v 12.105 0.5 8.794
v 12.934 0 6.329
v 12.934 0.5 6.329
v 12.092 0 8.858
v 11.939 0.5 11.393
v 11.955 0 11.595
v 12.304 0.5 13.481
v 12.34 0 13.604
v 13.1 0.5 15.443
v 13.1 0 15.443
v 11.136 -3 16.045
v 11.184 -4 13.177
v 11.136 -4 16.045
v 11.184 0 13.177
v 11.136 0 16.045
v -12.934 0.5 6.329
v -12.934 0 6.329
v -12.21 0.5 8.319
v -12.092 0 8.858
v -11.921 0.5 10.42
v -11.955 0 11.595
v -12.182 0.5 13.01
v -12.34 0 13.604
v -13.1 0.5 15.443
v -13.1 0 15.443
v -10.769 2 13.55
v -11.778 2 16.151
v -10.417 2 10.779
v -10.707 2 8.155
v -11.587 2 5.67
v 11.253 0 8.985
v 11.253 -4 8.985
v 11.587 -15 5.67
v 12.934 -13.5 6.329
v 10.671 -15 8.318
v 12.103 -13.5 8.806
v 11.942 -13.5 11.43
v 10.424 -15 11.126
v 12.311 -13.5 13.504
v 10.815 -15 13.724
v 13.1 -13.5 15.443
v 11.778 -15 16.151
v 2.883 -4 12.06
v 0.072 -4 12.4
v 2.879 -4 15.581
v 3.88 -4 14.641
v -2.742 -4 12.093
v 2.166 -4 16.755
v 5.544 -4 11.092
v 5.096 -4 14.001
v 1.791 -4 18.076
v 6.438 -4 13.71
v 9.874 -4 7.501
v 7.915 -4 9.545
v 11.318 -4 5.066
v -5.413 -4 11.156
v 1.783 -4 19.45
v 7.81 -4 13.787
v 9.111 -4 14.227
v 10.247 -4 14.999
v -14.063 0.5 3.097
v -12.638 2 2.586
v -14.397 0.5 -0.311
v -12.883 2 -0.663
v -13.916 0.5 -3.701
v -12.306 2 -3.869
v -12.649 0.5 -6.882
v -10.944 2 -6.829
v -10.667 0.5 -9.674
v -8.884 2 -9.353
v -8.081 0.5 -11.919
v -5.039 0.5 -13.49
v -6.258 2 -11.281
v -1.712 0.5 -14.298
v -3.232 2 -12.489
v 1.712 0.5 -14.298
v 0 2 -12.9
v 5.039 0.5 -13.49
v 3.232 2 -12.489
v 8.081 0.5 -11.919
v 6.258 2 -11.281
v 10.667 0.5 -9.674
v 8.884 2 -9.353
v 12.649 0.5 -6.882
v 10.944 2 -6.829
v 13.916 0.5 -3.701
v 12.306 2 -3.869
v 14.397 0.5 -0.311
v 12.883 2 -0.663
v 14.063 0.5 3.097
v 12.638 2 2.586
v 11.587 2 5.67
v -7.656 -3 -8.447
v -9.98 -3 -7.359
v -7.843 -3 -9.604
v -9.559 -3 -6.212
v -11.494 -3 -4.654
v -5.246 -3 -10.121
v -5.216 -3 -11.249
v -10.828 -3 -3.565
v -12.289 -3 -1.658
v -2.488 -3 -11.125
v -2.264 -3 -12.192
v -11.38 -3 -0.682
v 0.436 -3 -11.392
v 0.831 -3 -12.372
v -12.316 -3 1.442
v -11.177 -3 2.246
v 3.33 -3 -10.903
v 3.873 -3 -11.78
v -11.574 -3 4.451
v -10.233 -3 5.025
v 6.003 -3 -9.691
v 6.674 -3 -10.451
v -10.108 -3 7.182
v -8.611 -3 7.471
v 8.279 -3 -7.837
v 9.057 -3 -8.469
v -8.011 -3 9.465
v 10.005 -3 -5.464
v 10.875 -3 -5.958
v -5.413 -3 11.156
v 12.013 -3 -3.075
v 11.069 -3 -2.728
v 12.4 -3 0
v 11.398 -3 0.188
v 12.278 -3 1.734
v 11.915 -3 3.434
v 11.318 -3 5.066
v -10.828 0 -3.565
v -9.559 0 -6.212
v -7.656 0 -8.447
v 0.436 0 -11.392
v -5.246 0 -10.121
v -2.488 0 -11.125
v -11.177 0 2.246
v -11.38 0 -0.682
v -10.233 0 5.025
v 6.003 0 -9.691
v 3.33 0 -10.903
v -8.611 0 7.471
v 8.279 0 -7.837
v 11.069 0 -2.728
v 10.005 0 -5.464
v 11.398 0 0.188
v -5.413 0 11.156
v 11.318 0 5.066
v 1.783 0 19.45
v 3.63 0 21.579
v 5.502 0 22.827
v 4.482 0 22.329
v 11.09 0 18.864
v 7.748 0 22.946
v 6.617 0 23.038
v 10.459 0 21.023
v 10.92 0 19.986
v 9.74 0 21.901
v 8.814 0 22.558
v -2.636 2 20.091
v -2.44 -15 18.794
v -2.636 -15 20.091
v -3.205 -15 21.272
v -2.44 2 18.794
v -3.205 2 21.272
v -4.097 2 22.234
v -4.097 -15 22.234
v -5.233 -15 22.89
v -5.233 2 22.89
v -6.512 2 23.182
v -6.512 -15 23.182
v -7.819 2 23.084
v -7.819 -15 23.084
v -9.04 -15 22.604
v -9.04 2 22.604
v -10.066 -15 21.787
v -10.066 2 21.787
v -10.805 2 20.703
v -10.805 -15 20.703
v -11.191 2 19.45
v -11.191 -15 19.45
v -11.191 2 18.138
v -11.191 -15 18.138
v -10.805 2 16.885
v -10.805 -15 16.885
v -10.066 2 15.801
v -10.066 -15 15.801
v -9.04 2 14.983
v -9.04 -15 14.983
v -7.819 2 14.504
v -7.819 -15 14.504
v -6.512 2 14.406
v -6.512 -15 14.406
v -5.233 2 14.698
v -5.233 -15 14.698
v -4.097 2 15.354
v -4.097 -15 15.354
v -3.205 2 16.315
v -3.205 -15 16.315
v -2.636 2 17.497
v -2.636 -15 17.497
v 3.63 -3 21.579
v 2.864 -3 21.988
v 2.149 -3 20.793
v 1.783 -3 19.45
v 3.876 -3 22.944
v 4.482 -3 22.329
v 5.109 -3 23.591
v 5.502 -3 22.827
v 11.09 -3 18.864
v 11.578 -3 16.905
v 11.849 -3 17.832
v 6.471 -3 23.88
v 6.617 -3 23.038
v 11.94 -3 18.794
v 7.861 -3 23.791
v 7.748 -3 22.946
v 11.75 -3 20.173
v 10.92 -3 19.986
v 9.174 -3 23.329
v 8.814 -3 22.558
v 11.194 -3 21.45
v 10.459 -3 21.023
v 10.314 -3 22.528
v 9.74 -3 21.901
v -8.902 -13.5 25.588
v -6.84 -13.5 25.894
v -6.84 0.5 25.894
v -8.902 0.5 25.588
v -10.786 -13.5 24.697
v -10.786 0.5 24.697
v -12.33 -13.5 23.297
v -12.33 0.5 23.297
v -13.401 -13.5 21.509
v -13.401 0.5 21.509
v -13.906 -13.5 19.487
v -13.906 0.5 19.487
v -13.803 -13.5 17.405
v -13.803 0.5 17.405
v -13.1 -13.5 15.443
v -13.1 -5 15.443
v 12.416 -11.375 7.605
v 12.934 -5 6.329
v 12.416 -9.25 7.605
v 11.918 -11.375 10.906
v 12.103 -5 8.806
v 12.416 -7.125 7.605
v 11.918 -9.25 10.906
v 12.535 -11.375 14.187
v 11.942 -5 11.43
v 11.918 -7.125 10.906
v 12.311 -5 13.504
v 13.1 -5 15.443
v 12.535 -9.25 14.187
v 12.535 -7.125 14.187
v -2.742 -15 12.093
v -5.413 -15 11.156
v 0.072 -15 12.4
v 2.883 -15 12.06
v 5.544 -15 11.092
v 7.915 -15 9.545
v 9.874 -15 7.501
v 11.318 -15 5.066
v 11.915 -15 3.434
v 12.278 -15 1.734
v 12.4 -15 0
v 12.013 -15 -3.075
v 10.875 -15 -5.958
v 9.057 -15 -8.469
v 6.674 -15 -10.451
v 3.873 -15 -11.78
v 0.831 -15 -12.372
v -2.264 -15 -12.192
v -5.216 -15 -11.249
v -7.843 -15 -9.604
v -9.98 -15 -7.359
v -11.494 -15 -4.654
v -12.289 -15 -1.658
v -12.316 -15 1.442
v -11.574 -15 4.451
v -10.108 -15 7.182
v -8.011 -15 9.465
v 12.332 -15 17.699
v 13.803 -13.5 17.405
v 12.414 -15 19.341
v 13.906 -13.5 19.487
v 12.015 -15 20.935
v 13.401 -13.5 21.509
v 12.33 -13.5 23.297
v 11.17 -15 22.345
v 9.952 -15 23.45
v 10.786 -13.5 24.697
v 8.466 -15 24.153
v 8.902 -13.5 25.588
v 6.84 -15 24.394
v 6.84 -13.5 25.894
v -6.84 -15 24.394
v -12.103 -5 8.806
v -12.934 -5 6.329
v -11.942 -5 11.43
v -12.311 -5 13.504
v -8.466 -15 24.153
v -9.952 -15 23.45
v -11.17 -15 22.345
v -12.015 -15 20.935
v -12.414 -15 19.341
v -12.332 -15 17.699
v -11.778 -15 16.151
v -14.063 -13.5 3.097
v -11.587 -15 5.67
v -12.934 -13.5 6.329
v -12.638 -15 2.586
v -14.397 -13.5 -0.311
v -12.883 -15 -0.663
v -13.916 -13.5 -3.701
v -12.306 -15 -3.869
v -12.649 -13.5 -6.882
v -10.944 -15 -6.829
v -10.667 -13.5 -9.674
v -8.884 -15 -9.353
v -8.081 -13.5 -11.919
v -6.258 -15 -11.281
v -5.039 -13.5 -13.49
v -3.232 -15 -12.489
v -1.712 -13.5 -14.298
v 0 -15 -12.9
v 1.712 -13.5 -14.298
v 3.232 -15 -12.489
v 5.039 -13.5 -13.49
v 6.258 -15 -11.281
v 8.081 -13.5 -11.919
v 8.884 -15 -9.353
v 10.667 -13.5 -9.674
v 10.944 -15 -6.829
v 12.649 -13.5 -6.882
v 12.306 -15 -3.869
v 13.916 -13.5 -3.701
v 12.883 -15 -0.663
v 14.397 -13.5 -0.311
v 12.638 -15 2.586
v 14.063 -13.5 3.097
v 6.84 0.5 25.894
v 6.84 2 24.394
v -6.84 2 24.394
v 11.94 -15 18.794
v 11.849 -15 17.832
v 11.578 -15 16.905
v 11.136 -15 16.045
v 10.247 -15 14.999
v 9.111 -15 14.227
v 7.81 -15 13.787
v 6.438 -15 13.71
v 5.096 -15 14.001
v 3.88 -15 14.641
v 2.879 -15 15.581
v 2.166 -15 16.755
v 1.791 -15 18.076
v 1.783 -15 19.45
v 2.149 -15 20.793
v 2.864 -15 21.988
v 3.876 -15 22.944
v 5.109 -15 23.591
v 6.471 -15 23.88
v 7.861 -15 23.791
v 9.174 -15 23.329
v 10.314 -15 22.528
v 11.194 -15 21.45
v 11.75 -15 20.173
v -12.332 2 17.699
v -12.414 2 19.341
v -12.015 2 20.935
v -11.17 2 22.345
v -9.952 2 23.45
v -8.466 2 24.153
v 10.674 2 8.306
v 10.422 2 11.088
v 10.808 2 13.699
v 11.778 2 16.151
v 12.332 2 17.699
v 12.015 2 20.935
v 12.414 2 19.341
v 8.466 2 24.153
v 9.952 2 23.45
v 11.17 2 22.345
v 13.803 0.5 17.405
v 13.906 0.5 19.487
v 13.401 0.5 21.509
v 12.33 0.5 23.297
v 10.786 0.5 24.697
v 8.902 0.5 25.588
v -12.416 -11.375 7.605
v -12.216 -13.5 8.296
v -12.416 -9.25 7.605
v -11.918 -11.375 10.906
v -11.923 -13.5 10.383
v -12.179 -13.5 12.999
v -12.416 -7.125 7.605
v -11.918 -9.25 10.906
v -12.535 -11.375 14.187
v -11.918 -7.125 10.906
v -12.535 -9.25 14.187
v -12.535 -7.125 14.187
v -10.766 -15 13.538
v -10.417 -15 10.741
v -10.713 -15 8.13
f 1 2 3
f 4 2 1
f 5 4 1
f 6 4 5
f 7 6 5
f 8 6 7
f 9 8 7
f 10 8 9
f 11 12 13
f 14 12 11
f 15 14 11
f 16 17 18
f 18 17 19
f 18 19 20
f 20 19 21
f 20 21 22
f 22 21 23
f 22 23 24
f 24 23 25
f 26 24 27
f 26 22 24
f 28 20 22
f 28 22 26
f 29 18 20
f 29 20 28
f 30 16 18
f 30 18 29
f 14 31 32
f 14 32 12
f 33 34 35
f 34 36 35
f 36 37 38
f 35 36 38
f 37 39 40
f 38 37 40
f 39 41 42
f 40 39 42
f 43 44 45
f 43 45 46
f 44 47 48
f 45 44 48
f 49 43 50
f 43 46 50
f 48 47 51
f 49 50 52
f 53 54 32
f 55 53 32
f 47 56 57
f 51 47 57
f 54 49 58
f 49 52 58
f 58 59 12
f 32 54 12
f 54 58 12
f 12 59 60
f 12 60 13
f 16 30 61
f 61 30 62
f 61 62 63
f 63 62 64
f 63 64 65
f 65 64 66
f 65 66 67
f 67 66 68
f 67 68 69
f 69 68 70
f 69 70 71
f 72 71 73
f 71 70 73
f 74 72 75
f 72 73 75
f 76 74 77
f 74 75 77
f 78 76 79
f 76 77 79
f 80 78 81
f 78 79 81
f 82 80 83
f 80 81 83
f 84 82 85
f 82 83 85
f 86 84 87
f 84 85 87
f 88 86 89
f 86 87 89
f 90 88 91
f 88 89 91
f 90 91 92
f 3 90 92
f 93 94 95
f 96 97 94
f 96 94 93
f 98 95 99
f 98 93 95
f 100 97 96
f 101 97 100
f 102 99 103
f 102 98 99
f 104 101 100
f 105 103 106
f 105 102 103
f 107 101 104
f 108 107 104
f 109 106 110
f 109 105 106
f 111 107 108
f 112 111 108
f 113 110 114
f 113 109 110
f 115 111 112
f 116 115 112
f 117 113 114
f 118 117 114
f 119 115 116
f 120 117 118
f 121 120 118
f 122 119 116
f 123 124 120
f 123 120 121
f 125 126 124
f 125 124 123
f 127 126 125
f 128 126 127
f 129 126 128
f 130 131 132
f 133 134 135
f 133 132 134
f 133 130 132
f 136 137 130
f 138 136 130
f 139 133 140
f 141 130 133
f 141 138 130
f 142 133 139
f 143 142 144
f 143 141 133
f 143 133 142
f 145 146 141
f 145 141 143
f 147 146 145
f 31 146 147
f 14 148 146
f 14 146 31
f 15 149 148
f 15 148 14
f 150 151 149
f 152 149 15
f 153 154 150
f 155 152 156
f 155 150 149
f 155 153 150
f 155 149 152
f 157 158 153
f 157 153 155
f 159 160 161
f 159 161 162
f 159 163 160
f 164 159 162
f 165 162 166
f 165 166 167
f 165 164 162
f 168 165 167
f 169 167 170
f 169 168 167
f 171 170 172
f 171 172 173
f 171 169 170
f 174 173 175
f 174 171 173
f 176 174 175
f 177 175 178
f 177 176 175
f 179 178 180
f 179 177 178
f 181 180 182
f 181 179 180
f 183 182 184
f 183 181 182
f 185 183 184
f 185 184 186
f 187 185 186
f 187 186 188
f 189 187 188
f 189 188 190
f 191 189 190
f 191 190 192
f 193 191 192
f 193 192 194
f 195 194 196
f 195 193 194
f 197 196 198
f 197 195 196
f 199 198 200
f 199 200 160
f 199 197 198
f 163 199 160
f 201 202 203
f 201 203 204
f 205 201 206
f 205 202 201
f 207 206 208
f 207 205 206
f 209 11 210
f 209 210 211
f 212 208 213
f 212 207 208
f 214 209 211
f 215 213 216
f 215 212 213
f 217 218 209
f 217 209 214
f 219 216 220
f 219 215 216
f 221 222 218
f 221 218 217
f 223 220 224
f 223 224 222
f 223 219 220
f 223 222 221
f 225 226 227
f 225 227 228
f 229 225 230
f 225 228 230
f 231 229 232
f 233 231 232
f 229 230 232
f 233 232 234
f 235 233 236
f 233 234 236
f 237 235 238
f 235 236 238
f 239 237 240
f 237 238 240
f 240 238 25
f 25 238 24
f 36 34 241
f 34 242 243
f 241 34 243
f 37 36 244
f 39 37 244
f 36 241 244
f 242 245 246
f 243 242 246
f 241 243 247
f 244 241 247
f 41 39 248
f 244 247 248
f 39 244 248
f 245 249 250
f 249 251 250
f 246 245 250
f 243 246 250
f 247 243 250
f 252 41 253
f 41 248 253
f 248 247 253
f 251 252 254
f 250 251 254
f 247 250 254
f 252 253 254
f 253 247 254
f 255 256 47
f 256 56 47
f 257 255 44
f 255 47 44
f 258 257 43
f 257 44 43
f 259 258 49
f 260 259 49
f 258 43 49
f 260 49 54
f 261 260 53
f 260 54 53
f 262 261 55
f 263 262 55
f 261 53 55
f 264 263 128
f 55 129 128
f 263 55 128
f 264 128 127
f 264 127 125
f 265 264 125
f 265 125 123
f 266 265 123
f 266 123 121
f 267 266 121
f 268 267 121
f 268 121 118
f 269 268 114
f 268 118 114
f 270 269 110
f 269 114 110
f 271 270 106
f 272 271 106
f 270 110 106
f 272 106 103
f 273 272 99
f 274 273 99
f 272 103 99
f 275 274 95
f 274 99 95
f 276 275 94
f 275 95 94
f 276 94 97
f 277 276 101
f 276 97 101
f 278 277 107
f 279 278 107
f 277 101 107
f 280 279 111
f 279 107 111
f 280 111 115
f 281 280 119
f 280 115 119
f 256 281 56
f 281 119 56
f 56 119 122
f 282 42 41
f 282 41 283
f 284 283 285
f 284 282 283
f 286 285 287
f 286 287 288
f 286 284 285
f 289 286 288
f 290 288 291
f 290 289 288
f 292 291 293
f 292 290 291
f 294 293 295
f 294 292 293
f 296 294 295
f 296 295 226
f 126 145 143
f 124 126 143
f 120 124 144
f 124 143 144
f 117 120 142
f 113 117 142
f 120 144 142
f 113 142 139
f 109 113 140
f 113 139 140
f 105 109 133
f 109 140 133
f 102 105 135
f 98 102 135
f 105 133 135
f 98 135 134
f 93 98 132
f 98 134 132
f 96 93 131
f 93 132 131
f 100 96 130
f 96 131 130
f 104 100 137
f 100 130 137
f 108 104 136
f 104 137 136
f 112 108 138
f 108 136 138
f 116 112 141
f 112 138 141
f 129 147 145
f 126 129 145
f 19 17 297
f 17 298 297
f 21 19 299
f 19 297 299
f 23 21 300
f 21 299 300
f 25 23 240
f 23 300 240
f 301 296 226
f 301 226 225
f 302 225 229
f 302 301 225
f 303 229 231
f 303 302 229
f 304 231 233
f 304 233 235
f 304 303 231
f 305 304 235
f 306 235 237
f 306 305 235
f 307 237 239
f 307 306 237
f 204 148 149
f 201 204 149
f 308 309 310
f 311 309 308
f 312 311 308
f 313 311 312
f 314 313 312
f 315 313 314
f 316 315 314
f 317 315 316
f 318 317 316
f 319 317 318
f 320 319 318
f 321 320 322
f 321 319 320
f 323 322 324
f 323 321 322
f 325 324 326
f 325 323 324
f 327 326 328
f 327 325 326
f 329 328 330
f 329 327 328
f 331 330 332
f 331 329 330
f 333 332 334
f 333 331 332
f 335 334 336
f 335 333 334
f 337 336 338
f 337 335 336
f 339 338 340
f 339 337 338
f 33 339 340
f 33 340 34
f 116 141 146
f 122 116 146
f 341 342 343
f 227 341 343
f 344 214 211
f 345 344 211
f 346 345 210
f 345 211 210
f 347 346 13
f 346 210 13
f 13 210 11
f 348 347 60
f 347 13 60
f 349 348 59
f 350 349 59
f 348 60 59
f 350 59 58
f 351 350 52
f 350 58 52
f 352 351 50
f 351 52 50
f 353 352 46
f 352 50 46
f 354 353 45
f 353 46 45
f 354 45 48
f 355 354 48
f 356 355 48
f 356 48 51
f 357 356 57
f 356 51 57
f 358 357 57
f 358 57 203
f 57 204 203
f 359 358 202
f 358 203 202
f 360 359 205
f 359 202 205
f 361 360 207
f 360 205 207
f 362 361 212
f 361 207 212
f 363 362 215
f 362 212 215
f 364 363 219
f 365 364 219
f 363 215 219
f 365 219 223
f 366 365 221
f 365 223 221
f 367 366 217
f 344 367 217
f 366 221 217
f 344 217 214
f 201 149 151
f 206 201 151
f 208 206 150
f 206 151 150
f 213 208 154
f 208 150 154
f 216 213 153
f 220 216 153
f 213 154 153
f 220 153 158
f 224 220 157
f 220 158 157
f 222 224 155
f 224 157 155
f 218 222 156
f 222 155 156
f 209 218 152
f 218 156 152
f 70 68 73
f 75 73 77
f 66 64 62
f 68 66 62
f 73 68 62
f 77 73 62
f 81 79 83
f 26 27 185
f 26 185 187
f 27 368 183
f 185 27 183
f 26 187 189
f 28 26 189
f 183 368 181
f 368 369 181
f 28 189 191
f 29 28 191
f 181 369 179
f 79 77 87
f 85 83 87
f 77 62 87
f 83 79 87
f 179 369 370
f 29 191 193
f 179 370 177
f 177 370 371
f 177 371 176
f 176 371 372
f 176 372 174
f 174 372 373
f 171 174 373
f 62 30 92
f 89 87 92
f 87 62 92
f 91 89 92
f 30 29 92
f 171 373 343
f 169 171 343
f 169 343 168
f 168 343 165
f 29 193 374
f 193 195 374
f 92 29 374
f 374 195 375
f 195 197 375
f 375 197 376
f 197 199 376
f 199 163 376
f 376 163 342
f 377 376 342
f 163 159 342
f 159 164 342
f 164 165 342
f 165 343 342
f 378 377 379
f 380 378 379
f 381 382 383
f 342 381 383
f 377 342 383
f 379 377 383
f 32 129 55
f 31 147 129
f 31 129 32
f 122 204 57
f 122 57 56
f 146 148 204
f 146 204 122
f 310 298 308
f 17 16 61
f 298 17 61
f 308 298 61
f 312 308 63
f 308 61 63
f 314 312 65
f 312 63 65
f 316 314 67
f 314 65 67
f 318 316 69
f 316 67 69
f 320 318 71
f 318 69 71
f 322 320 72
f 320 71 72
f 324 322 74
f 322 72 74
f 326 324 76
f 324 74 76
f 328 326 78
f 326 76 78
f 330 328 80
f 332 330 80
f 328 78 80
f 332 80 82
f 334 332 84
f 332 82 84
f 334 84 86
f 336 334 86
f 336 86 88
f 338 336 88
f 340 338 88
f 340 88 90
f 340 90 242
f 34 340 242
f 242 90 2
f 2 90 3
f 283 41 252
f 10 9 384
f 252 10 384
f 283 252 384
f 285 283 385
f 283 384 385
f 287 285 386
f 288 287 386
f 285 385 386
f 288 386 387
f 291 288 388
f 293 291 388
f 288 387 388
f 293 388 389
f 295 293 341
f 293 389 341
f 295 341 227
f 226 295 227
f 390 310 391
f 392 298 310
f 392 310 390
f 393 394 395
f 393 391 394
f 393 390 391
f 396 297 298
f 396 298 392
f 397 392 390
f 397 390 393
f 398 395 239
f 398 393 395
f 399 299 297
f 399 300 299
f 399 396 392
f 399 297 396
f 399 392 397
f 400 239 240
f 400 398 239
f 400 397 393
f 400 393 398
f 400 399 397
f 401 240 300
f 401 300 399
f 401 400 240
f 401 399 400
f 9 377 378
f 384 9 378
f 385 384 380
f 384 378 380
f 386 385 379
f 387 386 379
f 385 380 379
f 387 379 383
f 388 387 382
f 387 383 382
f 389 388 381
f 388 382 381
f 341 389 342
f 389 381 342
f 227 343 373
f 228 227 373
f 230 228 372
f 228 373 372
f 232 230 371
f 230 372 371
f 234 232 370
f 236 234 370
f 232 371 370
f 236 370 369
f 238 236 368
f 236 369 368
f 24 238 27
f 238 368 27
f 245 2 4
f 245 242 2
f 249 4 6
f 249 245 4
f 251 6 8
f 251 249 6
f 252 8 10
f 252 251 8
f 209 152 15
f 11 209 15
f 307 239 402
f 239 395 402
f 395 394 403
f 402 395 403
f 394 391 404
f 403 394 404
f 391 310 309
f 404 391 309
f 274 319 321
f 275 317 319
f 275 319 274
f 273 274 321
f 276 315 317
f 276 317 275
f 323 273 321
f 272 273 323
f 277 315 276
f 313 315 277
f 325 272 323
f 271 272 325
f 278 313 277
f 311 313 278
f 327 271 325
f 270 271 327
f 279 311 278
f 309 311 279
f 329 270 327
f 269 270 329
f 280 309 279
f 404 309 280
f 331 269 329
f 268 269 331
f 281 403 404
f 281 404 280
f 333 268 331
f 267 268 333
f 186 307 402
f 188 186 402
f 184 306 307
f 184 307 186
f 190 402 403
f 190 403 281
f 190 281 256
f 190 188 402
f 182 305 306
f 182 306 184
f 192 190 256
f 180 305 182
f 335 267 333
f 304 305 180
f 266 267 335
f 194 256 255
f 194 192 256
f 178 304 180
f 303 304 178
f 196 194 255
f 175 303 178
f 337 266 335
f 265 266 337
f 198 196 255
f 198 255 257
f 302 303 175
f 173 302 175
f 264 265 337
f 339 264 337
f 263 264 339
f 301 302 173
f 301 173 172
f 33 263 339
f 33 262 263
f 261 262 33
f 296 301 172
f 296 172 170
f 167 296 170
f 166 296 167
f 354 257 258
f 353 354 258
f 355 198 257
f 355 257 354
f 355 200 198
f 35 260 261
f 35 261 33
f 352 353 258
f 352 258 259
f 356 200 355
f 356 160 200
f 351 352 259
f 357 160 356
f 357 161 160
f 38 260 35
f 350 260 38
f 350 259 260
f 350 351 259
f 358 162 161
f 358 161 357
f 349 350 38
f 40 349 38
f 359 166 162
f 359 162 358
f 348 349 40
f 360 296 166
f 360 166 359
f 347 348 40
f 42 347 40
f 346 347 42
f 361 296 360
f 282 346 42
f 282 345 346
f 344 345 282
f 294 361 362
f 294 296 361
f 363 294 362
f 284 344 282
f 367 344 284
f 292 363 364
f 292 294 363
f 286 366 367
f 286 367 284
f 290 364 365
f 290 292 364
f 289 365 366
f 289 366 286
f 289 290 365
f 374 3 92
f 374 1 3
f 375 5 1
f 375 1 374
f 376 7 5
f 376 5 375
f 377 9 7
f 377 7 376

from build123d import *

# Parameters (mm, degrees)
F0_R     = 4.4
F1_DEPTH = 5
F2_DEPTH = 2
F3_R     = 10
F4_DEPTH = 3
F5_DEPTH = 4
F6_DEPTH = 10
F7_SIZE  = 1.5


with BuildPart() as f1:
    # F0 (on Front) → F1 (new body)
    with BuildSketch(Plane.XZ):
        with BuildLine():
            ThreePointArc((-5.4134613959, 11.1559148309), (4.2410497772, 11.6521884977), (11.3178358484, 5.0662206533))
            Line((11.3178358484, 5.0662206533), (11.2530788382, 8.9848882386))
            ThreePointArc((11.2530788382, 8.9848882386), (9.8365288611, 10.5167818254), (8.2134709888, 11.8278862996))
            ThreePointArc((8.2134709888, 11.8278862996), (9.7771968263, 12.3297019504), (11.1837970537, 13.1773653522))
            Line((11.1837970537, 13.1773653522), (11.1364032022, 16.0453289729))
            ThreePointArc((11.1364032022, 16.0453289729), (5.0961001356, 14.0014200497), (1.7827588677, 19.4497770926))
            Line((1.7827588677, 19.4497770926), (-5.4134613959, 11.1559148309))
        make_face()
        with BuildLine():
            ThreePointArc((11.3178358484, 5.0662206533), (12.1264414508, 2.5902543774), (12.4, 0))
            ThreePointArc((12.4, 0), (-6.5815301675, -10.5092083743), (-5.4134613959, 11.1559148309))
            Line((-5.4134613959, 11.1559148309), (1.7827588677, 19.4497770926))
            ThreePointArc((1.7827588677, 19.4497770926), (7.1690482729, 23.8832523997), (11.9404028665, 18.7938524157))
            ThreePointArc((11.9404028665, 18.7938524157), (11.7352778247, 17.362000767), (11.1364032022, 16.0453289729))
            Line((11.1364032022, 16.0453289729), (11.1837970537, 13.1773653522))
            ThreePointArc((11.1837970537, 13.1773653522), (13.5592963078, 21.0887316989), (6.8404028665, 25.8938524157))
            Line((6.8404028665, 25.8938524157), (-6.8404028665, 25.8938524157))
            ThreePointArc((-6.8404028665, 25.8938524157), (-13.9068149485, 19.4836496958), (-8.2134709888, 11.8278862996))
            ThreePointArc((-8.2134709888, 11.8278862996), (-2.0809765648, -14.2488433403), (11.2530788382, 8.9848882386))
            Line((11.2530788382, 8.9848882386), (11.3178358484, 5.0662206533))
        make_face()
        with Locations((-6.8404028665, 18.7938524157)):
            Circle(F0_R, mode=Mode.SUBTRACT)
    extrude(amount=F1_DEPTH)

    # F0 (on Front) → F2 (join)
    with BuildSketch(Plane.XZ):
        with BuildLine():
            ThreePointArc((11.3178358484, 5.0662206533), (12.1264414508, 2.5902543774), (12.4, 0))
            ThreePointArc((12.4, 0), (-6.5815301675, -10.5092083743), (-5.4134613959, 11.1559148309))
            Line((-5.4134613959, 11.1559148309), (1.7827588677, 19.4497770926))
            ThreePointArc((1.7827588677, 19.4497770926), (7.1690482729, 23.8832523997), (11.9404028665, 18.7938524157))
            ThreePointArc((11.9404028665, 18.7938524157), (11.7352778247, 17.362000767), (11.1364032022, 16.0453289729))
            Line((11.1364032022, 16.0453289729), (11.1837970537, 13.1773653522))
            ThreePointArc((11.1837970537, 13.1773653522), (13.5592963078, 21.0887316989), (6.8404028665, 25.8938524157))
            Line((6.8404028665, 25.8938524157), (-6.8404028665, 25.8938524157))
            ThreePointArc((-6.8404028665, 25.8938524157), (-13.9068149485, 19.4836496958), (-8.2134709888, 11.8278862996))
            ThreePointArc((-8.2134709888, 11.8278862996), (-2.0809765648, -14.2488433403), (11.2530788382, 8.9848882386))
            Line((11.2530788382, 8.9848882386), (11.3178358484, 5.0662206533))
        make_face()
        with Locations((-6.8404028665, 18.7938524157)):
            Circle(F0_R, mode=Mode.SUBTRACT)
        with BuildLine():
            ThreePointArc((-5.4134613959, 11.1559148309), (4.2410497772, 11.6521884977), (11.3178358484, 5.0662206533))
            Line((11.3178358484, 5.0662206533), (11.2530788382, 8.9848882386))
            ThreePointArc((11.2530788382, 8.9848882386), (9.8365288611, 10.5167818254), (8.2134709888, 11.8278862996))
            ThreePointArc((8.2134709888, 11.8278862996), (9.7771968263, 12.3297019504), (11.1837970537, 13.1773653522))
            Line((11.1837970537, 13.1773653522), (11.1364032022, 16.0453289729))
            ThreePointArc((11.1364032022, 16.0453289729), (5.0961001356, 14.0014200497), (1.7827588677, 19.4497770926))
            Line((1.7827588677, 19.4497770926), (-5.4134613959, 11.1559148309))
        make_face()
        with BuildLine():
            ThreePointArc((11.0898226812, 18.8640751933), (8.2939884756, 22.7875460541), (3.6302967624, 21.5791205895))
            ThreePointArc((3.6302967624, 21.5791205895), (5.3538718279, 14.8123042908), (11.0904028665, 18.7938524157))
            ThreePointArc((11.0904028665, 18.7938524157), (11.0902578177, 18.8289650029), (11.0898226812, 18.8640751933))
        make_face()
        with BuildLine():
            Line((3.6302967624, 21.5791205895), (1.7827588677, 19.4497770926))
            ThreePointArc((1.7827588677, 19.4497770926), (5.0961001356, 14.0014200497), (11.1364032022, 16.0453289729))
            Line((11.1364032022, 16.0453289729), (11.0898226812, 18.8640751933))
            ThreePointArc((11.0898226812, 18.8640751933), (11.0902578177, 18.8289650029), (11.0904028665, 18.7938524157))
            ThreePointArc((11.0904028665, 18.7938524157), (5.3538718279, 14.8123042908), (3.6302967624, 21.5791205895))
        make_face()
        with BuildLine():
            ThreePointArc((11.9404028665, 18.7938524157), (7.1690482729, 23.8832523997), (1.7827588677, 19.4497770926))
            Line((1.7827588677, 19.4497770926), (3.6302967624, 21.5791205895))
            ThreePointArc((3.6302967624, 21.5791205895), (8.2939884756, 22.7875460541), (11.0898226812, 18.8640751933))
            Line((11.0898226812, 18.8640751933), (11.1364032022, 16.0453289729))
            ThreePointArc((11.1364032022, 16.0453289729), (11.7352778247, 17.362000767), (11.9404028665, 18.7938524157))
        make_face()
        with BuildLine():
            Line((11.3984437382, 0.188362274), (11.3178358484, 5.0662206533))
            ThreePointArc((11.3178358484, 5.0662206533), (4.2410497772, 11.6521884977), (-5.4134613959, 11.1559148309))
            Line((-5.4134613959, 11.1559148309), (-8.61063755, 7.471072278))
            ThreePointArc((-8.61063755, 7.471072278), (-3.8990296339, -10.712495877), (11.3984437382, 0.188362274))
        make_face()
        with BuildLine():
            ThreePointArc((-5.4134613959, 11.1559148309), (-6.5815301675, -10.5092083743), (12.4, 0))
            ThreePointArc((12.4, 0), (12.1264414508, 2.5902543774), (11.3178358484, 5.0662206533))
            Line((11.3178358484, 5.0662206533), (11.3984437382, 0.188362274))
            ThreePointArc((11.3984437382, 0.188362274), (-3.8990296339, -10.712495877), (-8.61063755, 7.471072278))
            Line((-8.61063755, 7.471072278), (-5.4134613959, 11.1559148309))
        make_face()
    extrude(amount=-F2_DEPTH)

    # F3
    f3_edges = [f1.edges().sort_by_distance(p)[0] for p in [
        (8.213471, -1.5, 11.827886),
        (-8.213471, -1.5, 11.827886),
    ]]
    fillet(f3_edges, radius=F3_R)

    # F0 (on Front) → F4 (join)
    with BuildSketch(Plane.XZ):
        with BuildLine():
            ThreePointArc((-5.4134613959, 11.1559148309), (-6.5815301675, -10.5092083743), (12.4, 0))
            ThreePointArc((12.4, 0), (12.1264414508, 2.5902543774), (11.3178358484, 5.0662206533))
            Line((11.3178358484, 5.0662206533), (11.3984437382, 0.188362274))
            ThreePointArc((11.3984437382, 0.188362274), (-3.8990296339, -10.712495877), (-8.61063755, 7.471072278))
            Line((-8.61063755, 7.471072278), (-5.4134613959, 11.1559148309))
        make_face()
        with BuildLine():
            ThreePointArc((11.9404028665, 18.7938524157), (7.1690482729, 23.8832523997), (1.7827588677, 19.4497770926))
            Line((1.7827588677, 19.4497770926), (3.6302967624, 21.5791205895))
            ThreePointArc((3.6302967624, 21.5791205895), (8.2939884756, 22.7875460541), (11.0898226812, 18.8640751933))
            Line((11.0898226812, 18.8640751933), (11.1364032022, 16.0453289729))
            ThreePointArc((11.1364032022, 16.0453289729), (11.7352778247, 17.362000767), (11.9404028665, 18.7938524157))
        make_face()
    extrude(amount=F4_DEPTH)

    # F0 (on Front) → F5 (cut)
    with BuildSketch(Plane.XZ):
        with BuildLine():
            Line((11.3984437382, 0.188362274), (11.3178358484, 5.0662206533))
            ThreePointArc((11.3178358484, 5.0662206533), (4.2410497772, 11.6521884977), (-5.4134613959, 11.1559148309))
            Line((-5.4134613959, 11.1559148309), (-8.61063755, 7.471072278))
            ThreePointArc((-8.61063755, 7.471072278), (-3.8990296339, -10.712495877), (11.3984437382, 0.188362274))
        make_face()
        with BuildLine():
            ThreePointArc((-5.4134613959, 11.1559148309), (4.2410497772, 11.6521884977), (11.3178358484, 5.0662206533))
            Line((11.3178358484, 5.0662206533), (11.2530788382, 8.9848882386))
            ThreePointArc((11.2530788382, 8.9848882386), (9.8365288611, 10.5167818254), (8.2134709888, 11.8278862996))
            ThreePointArc((8.2134709888, 11.8278862996), (9.7771968263, 12.3297019504), (11.1837970537, 13.1773653522))
            Line((11.1837970537, 13.1773653522), (11.1364032022, 16.0453289729))
            ThreePointArc((11.1364032022, 16.0453289729), (5.0961001356, 14.0014200497), (1.7827588677, 19.4497770926))
            Line((1.7827588677, 19.4497770926), (-5.4134613959, 11.1559148309))
        make_face()
        with BuildLine():
            Line((3.6302967624, 21.5791205895), (1.7827588677, 19.4497770926))
            ThreePointArc((1.7827588677, 19.4497770926), (5.0961001356, 14.0014200497), (11.1364032022, 16.0453289729))
            Line((11.1364032022, 16.0453289729), (11.0898226812, 18.8640751933))
            ThreePointArc((11.0898226812, 18.8640751933), (11.0902578177, 18.8289650029), (11.0904028665, 18.7938524157))
            ThreePointArc((11.0904028665, 18.7938524157), (5.3538718279, 14.8123042908), (3.6302967624, 21.5791205895))
        make_face()
        with BuildLine():
            ThreePointArc((11.0898226812, 18.8640751933), (8.2939884756, 22.7875460541), (3.6302967624, 21.5791205895))
            ThreePointArc((3.6302967624, 21.5791205895), (5.3538718279, 14.8123042908), (11.0904028665, 18.7938524157))
            ThreePointArc((11.0904028665, 18.7938524157), (11.0902578177, 18.8289650029), (11.0898226812, 18.8640751933))
        make_face()
        with BuildLine():
            ThreePointArc((8.2134709888, 11.8278862996), (9.8365288611, 10.5167818254), (11.2530788382, 8.9848882386))
            Line((11.2530788382, 8.9848882386), (11.1837970537, 13.1773653522))
            ThreePointArc((11.1837970537, 13.1773653522), (9.7771968263, 12.3297019504), (8.2134709888, 11.8278862996))
        make_face()
    extrude(amount=F5_DEPTH, mode=Mode.SUBTRACT)

    # F6 (add): a face of the model
    f6_faces = [f1.faces().sort_by_distance(p)[0] for p in [
        (12.5064069452, -5, 22.1877746808),
    ]]
    extrude(f6_faces, amount=F6_DEPTH)

    # F7
    f7_edges = [f1.edges().sort_by_distance(p)[0] for p in [
        (0, 2, -14.4),
        (0, -15, -14.4),
        (12.931295, -15, 22.442281),
        (12.931295, 2, 22.442281),
        (-11.918405, 2, 10.906319),
        (11.918405, 2, 10.906319),
        (-12.931295, 2, 22.442281),
        (0, 2, 25.893852),
        (-12.931295, -15, 22.442281),
        (-11.918405, -15, 10.906319),
        (0, -15, 25.893852),
        (11.918405, -15, 10.906319),
    ]]
    chamfer(f7_edges, length=F7_SIZE)


solid = f1.part
